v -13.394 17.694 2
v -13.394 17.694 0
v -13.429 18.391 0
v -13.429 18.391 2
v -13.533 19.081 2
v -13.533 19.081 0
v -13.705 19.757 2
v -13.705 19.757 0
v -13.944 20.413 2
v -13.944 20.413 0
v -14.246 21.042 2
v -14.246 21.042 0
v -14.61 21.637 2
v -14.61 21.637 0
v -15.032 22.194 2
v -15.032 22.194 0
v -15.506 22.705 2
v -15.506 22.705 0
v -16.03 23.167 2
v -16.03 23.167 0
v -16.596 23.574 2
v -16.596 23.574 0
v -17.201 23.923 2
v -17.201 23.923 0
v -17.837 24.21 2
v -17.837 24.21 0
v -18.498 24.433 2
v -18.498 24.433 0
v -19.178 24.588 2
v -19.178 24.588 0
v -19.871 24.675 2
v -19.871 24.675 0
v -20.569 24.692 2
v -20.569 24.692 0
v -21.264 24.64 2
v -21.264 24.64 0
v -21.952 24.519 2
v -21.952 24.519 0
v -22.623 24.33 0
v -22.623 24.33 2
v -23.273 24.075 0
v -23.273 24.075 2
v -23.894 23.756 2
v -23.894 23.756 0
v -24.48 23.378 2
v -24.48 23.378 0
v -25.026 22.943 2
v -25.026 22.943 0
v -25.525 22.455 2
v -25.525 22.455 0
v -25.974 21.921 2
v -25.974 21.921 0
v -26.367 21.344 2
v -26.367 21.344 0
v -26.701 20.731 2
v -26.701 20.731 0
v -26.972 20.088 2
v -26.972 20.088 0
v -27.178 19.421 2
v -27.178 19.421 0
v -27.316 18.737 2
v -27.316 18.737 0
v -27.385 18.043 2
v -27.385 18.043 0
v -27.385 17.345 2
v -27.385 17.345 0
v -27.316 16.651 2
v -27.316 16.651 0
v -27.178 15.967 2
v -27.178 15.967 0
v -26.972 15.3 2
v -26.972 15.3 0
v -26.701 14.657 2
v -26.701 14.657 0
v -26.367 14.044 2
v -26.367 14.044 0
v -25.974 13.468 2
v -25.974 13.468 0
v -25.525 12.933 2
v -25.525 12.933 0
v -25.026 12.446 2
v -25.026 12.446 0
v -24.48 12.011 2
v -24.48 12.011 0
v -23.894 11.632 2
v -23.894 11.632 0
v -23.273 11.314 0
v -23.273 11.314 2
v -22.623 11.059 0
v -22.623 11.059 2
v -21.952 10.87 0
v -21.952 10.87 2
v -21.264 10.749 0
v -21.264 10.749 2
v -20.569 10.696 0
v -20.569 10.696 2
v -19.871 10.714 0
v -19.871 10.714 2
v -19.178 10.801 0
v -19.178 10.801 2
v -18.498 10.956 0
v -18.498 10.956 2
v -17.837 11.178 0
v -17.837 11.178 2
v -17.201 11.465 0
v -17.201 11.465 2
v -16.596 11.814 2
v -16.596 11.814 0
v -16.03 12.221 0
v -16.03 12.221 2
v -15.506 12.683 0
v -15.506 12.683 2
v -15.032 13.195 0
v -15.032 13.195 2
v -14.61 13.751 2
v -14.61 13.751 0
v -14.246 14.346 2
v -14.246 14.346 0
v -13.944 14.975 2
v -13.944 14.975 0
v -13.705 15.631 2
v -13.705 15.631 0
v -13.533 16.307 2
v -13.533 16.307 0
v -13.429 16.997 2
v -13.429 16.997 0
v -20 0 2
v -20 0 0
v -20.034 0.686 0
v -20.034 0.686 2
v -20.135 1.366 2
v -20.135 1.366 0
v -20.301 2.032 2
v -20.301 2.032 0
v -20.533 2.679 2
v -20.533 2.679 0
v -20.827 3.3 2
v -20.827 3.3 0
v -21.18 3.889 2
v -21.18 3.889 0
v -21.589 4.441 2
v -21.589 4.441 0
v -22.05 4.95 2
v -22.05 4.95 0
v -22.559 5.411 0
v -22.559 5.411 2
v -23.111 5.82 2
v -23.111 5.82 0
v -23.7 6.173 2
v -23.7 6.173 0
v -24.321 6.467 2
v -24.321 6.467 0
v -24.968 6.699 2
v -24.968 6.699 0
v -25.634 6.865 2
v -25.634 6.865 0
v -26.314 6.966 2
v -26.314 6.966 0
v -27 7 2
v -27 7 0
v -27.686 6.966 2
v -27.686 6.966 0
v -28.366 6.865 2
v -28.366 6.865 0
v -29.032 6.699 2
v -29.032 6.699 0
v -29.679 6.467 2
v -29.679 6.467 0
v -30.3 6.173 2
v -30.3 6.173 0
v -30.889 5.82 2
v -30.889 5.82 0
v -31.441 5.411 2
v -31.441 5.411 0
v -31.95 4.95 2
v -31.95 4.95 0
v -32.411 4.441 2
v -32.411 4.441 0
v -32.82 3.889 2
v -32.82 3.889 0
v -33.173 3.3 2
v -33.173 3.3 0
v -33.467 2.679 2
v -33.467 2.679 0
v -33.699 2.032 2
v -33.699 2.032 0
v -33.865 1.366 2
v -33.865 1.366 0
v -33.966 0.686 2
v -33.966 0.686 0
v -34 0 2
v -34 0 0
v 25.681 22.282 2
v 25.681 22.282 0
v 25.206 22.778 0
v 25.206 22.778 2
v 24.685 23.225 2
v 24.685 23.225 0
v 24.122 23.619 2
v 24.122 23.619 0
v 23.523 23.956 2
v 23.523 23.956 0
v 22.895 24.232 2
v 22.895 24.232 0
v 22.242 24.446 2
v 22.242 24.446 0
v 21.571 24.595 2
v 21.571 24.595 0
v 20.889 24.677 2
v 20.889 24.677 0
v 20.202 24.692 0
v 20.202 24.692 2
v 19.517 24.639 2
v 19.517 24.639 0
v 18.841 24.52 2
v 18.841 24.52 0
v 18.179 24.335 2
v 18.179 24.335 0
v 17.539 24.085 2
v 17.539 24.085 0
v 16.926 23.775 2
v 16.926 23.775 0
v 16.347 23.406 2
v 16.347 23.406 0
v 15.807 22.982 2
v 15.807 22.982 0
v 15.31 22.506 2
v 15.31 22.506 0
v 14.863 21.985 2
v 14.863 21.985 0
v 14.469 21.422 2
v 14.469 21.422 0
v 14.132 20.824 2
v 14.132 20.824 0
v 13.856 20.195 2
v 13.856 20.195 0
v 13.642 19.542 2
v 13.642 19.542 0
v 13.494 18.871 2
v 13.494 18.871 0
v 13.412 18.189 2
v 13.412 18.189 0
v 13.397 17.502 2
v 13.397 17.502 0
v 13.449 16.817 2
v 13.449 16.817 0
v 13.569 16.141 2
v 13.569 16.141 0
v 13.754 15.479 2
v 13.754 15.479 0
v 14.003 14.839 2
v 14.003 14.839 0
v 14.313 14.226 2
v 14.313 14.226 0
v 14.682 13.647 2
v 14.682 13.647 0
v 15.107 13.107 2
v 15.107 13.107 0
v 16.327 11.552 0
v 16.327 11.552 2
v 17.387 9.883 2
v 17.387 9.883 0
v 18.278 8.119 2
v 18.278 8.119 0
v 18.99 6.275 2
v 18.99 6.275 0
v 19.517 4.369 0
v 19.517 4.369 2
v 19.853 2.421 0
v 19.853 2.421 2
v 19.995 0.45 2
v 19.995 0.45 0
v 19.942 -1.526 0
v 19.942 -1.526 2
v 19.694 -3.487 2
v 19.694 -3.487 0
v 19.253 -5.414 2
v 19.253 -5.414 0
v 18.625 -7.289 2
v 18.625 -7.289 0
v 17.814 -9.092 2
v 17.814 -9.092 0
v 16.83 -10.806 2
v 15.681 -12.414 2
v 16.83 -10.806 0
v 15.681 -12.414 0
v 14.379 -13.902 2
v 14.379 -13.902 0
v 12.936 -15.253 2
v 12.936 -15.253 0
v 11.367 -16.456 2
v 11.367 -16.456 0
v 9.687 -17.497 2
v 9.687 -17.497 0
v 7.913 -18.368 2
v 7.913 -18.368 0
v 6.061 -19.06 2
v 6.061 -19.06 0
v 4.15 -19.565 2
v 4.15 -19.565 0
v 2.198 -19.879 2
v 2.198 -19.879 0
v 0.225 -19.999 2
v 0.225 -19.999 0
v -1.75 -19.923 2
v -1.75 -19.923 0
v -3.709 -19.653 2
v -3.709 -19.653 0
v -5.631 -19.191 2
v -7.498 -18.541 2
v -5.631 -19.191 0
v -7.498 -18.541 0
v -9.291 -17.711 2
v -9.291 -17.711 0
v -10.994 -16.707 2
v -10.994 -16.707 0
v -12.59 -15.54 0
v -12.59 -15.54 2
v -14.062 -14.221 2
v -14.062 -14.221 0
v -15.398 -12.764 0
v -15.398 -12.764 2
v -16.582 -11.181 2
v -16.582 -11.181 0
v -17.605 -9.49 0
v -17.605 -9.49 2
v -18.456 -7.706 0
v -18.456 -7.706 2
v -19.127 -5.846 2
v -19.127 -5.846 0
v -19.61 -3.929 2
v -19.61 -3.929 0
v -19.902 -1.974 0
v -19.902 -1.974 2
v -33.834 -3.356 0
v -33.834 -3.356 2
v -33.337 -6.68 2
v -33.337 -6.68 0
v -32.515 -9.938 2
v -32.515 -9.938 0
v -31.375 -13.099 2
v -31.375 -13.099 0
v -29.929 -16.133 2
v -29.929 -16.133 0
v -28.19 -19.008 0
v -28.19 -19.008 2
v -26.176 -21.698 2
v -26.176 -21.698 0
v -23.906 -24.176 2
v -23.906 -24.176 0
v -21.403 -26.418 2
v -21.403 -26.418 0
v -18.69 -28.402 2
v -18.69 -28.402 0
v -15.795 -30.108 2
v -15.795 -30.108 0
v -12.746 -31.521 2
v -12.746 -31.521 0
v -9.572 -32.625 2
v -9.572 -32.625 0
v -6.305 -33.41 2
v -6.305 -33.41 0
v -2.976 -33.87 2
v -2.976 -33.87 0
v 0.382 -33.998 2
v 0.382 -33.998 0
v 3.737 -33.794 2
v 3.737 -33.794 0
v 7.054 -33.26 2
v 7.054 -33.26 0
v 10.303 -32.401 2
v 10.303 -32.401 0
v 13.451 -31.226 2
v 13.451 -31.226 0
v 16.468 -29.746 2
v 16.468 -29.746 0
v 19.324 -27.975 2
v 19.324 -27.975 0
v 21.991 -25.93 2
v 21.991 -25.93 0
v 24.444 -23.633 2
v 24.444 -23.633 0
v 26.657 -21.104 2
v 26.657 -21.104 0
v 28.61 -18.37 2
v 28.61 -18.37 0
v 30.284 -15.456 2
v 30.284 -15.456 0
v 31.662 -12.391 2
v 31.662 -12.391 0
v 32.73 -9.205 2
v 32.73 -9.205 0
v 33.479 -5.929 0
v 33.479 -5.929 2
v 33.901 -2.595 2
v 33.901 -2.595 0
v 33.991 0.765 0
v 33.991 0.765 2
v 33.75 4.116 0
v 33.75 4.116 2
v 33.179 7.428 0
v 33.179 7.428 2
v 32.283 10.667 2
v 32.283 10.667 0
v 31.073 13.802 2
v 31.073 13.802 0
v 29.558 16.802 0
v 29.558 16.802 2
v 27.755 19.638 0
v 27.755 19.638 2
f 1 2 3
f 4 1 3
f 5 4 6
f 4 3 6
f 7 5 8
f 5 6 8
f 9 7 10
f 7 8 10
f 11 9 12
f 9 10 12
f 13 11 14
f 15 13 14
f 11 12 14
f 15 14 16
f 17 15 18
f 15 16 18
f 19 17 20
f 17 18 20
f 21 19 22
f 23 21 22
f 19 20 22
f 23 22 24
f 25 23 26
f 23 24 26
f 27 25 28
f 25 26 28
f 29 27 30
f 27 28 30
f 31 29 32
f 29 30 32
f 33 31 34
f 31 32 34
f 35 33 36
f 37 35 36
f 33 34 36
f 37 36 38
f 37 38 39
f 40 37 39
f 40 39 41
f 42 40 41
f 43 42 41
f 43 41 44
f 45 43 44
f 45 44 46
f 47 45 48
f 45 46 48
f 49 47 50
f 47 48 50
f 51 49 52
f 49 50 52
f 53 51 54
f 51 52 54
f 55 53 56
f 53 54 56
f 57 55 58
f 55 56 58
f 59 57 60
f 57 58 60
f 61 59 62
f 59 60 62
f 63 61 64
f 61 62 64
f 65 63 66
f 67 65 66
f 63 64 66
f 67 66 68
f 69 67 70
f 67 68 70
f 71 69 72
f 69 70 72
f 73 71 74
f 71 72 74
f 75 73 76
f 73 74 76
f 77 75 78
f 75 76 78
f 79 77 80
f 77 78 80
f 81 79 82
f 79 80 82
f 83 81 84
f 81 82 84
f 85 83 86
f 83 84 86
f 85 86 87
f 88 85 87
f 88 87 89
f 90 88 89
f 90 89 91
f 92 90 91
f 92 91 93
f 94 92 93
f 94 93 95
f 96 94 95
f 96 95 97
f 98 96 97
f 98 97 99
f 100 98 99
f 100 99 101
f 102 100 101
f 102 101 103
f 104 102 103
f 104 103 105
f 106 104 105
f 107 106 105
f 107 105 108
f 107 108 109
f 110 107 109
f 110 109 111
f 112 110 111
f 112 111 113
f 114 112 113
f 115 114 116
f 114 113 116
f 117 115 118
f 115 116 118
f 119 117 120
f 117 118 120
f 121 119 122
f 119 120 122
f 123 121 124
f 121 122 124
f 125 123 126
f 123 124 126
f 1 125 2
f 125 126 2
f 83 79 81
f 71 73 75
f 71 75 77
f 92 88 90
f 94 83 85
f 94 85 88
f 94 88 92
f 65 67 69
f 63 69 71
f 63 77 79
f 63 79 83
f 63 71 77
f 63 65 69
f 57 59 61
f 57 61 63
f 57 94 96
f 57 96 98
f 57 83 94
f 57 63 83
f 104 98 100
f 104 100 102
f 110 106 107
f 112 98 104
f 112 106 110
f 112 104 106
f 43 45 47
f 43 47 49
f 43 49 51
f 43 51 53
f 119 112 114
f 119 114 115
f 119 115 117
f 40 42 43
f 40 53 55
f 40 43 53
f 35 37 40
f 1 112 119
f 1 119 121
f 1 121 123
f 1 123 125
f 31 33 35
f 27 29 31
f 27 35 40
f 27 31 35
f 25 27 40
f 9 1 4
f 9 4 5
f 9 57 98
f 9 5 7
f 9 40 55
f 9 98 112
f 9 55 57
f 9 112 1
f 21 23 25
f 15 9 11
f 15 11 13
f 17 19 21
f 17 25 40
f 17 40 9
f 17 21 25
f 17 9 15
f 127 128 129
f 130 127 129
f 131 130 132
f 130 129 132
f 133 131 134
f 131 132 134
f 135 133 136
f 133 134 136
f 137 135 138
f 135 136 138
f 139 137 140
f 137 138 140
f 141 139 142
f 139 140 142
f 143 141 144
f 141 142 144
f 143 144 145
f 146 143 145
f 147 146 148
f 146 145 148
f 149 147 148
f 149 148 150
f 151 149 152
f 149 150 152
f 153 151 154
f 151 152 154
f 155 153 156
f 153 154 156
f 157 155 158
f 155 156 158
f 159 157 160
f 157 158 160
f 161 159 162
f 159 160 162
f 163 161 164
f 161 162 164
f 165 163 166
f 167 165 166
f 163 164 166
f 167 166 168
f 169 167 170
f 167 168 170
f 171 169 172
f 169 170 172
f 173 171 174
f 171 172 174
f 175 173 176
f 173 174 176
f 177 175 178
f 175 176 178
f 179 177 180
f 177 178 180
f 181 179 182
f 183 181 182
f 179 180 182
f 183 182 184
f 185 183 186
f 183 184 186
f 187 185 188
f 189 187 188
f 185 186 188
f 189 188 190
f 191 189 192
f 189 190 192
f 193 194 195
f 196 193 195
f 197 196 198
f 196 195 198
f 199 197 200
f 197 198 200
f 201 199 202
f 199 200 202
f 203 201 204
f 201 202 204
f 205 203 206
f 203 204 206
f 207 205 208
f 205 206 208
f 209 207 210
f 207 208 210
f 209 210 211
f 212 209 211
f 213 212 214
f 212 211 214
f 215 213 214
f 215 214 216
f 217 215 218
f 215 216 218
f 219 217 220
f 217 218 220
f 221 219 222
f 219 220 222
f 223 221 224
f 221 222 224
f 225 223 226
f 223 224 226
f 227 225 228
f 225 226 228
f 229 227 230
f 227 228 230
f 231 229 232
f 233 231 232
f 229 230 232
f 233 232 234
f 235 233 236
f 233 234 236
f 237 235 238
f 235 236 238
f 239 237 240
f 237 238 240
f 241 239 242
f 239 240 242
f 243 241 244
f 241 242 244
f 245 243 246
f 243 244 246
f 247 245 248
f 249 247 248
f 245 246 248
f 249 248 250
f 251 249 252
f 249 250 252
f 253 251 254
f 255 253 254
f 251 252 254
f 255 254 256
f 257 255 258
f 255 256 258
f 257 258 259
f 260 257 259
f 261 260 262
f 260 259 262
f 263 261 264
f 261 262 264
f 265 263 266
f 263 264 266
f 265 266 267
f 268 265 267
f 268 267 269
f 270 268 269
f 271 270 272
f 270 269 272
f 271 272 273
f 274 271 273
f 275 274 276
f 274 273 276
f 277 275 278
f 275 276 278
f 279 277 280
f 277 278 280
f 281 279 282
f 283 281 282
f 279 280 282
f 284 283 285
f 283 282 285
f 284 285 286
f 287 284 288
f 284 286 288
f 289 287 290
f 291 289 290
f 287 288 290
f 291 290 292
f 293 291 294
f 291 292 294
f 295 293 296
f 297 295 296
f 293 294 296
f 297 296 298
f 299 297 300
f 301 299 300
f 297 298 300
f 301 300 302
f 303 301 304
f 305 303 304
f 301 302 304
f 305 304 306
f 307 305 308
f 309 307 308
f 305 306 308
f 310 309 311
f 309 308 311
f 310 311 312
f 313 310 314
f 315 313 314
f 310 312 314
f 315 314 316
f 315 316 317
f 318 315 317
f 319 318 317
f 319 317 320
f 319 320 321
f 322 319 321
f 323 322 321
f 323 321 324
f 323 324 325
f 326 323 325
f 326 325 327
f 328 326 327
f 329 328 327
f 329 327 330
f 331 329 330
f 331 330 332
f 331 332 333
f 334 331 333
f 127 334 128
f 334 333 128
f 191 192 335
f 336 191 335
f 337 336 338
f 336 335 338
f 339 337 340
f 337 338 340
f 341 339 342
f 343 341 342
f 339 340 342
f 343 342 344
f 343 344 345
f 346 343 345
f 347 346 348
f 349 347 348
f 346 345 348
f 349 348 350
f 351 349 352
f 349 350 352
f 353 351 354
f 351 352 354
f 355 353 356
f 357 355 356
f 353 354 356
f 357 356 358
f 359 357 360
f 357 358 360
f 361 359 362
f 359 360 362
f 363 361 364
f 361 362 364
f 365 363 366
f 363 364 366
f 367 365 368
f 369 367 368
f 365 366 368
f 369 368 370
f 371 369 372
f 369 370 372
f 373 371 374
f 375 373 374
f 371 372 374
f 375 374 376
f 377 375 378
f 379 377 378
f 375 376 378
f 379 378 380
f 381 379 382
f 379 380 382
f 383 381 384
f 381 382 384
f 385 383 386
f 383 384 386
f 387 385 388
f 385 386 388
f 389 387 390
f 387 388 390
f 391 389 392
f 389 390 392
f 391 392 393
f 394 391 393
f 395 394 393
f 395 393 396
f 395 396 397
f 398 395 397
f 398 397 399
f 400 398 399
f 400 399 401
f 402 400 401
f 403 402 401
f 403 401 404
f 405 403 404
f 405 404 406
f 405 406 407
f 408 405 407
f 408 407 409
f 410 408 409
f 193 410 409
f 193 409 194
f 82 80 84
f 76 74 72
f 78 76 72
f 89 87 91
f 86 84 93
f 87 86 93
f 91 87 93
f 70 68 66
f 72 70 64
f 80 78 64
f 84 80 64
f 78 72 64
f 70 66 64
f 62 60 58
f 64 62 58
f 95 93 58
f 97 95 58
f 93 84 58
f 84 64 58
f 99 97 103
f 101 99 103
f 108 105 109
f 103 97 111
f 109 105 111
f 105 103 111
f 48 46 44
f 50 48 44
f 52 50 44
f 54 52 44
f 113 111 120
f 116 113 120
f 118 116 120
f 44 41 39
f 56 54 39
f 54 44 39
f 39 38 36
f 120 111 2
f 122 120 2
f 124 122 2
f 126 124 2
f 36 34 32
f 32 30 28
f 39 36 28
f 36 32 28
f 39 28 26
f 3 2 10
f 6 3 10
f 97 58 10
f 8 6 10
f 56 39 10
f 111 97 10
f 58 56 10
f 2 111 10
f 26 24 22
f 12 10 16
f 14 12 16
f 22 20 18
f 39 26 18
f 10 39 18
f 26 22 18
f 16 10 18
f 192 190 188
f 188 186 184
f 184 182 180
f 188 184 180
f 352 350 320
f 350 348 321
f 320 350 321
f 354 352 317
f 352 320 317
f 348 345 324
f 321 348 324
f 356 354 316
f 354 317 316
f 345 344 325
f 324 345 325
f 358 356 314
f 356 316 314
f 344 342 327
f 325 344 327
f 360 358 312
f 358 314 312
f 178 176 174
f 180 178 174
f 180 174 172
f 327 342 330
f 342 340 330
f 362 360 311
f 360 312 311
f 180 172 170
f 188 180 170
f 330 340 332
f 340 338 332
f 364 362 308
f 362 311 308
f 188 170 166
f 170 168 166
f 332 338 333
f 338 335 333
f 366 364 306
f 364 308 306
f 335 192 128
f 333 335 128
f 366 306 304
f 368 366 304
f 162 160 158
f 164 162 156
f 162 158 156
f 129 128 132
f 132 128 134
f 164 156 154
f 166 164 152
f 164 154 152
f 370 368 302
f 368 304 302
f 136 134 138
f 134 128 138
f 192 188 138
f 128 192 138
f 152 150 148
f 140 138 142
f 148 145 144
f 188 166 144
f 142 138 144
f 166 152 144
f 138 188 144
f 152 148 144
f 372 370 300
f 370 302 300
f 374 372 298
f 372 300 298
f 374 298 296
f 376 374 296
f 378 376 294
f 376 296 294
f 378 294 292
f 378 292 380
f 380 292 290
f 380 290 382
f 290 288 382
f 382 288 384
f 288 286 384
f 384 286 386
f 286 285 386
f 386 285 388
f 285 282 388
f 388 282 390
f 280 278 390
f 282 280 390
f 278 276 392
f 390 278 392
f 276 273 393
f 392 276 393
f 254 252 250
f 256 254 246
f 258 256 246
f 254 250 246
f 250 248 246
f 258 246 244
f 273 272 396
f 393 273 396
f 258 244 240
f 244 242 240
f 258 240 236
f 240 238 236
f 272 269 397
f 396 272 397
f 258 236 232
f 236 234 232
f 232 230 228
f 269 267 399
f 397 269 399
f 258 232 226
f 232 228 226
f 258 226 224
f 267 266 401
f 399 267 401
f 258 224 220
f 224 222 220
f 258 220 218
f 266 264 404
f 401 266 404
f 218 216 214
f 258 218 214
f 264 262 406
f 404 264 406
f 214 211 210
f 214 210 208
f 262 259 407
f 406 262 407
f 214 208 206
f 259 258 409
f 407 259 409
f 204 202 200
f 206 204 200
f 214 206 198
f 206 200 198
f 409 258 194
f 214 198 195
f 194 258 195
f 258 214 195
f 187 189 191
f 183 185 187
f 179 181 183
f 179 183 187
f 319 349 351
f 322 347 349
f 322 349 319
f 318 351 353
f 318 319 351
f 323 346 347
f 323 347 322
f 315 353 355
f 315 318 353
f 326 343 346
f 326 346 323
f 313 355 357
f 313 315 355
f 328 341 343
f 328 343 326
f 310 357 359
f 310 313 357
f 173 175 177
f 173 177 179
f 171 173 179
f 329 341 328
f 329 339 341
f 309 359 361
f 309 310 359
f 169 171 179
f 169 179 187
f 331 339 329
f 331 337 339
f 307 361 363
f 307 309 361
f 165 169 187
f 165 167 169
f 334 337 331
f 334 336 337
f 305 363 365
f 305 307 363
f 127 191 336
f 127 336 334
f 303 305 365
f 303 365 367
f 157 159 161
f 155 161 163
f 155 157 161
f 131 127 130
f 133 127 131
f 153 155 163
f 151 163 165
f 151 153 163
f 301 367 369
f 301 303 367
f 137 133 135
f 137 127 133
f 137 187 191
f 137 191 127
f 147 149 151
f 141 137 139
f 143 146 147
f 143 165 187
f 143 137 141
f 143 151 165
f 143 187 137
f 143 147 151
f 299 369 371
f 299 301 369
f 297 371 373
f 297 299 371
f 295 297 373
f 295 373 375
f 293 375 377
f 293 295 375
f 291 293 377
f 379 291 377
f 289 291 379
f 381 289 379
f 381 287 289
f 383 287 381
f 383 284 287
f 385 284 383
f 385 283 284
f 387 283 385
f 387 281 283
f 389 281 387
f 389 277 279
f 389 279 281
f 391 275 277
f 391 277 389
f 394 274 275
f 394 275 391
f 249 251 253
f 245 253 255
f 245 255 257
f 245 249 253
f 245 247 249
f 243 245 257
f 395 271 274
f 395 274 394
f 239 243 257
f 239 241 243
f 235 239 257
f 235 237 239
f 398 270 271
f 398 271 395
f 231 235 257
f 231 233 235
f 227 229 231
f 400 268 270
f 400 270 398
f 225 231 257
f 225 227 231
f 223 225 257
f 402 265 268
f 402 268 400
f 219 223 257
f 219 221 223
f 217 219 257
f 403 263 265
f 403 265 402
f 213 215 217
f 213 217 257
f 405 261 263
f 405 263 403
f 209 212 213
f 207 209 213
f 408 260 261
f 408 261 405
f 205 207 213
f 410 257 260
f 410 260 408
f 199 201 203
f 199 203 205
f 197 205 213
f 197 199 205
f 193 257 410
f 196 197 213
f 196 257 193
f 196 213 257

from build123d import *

# Parameters (mm, degrees)
F0_R     = 7
F1_DEPTH = 2


with BuildPart() as f1:
    # F0 (on Top) → F1 (new body)
    with BuildSketch(Plane.XY):
        with BuildLine():
            ThreePointArc((-20, 0), (-27, 7), (-34, 0))
            ThreePointArc((-34, 0), (11.891888, -31.852519), (25.681352, 22.281565))
            ThreePointArc((25.681352, 22.281565), (15.806634, 22.981521), (15.106678, 13.106803))
            ThreePointArc((15.106678, 13.106803), (6.995228, -18.736776), (-20, 0))
        make_face()
        with Locations((-20.394015, 17.694184)):
            Circle(F0_R)
    extrude(amount=F1_DEPTH)


solid = f1.part
